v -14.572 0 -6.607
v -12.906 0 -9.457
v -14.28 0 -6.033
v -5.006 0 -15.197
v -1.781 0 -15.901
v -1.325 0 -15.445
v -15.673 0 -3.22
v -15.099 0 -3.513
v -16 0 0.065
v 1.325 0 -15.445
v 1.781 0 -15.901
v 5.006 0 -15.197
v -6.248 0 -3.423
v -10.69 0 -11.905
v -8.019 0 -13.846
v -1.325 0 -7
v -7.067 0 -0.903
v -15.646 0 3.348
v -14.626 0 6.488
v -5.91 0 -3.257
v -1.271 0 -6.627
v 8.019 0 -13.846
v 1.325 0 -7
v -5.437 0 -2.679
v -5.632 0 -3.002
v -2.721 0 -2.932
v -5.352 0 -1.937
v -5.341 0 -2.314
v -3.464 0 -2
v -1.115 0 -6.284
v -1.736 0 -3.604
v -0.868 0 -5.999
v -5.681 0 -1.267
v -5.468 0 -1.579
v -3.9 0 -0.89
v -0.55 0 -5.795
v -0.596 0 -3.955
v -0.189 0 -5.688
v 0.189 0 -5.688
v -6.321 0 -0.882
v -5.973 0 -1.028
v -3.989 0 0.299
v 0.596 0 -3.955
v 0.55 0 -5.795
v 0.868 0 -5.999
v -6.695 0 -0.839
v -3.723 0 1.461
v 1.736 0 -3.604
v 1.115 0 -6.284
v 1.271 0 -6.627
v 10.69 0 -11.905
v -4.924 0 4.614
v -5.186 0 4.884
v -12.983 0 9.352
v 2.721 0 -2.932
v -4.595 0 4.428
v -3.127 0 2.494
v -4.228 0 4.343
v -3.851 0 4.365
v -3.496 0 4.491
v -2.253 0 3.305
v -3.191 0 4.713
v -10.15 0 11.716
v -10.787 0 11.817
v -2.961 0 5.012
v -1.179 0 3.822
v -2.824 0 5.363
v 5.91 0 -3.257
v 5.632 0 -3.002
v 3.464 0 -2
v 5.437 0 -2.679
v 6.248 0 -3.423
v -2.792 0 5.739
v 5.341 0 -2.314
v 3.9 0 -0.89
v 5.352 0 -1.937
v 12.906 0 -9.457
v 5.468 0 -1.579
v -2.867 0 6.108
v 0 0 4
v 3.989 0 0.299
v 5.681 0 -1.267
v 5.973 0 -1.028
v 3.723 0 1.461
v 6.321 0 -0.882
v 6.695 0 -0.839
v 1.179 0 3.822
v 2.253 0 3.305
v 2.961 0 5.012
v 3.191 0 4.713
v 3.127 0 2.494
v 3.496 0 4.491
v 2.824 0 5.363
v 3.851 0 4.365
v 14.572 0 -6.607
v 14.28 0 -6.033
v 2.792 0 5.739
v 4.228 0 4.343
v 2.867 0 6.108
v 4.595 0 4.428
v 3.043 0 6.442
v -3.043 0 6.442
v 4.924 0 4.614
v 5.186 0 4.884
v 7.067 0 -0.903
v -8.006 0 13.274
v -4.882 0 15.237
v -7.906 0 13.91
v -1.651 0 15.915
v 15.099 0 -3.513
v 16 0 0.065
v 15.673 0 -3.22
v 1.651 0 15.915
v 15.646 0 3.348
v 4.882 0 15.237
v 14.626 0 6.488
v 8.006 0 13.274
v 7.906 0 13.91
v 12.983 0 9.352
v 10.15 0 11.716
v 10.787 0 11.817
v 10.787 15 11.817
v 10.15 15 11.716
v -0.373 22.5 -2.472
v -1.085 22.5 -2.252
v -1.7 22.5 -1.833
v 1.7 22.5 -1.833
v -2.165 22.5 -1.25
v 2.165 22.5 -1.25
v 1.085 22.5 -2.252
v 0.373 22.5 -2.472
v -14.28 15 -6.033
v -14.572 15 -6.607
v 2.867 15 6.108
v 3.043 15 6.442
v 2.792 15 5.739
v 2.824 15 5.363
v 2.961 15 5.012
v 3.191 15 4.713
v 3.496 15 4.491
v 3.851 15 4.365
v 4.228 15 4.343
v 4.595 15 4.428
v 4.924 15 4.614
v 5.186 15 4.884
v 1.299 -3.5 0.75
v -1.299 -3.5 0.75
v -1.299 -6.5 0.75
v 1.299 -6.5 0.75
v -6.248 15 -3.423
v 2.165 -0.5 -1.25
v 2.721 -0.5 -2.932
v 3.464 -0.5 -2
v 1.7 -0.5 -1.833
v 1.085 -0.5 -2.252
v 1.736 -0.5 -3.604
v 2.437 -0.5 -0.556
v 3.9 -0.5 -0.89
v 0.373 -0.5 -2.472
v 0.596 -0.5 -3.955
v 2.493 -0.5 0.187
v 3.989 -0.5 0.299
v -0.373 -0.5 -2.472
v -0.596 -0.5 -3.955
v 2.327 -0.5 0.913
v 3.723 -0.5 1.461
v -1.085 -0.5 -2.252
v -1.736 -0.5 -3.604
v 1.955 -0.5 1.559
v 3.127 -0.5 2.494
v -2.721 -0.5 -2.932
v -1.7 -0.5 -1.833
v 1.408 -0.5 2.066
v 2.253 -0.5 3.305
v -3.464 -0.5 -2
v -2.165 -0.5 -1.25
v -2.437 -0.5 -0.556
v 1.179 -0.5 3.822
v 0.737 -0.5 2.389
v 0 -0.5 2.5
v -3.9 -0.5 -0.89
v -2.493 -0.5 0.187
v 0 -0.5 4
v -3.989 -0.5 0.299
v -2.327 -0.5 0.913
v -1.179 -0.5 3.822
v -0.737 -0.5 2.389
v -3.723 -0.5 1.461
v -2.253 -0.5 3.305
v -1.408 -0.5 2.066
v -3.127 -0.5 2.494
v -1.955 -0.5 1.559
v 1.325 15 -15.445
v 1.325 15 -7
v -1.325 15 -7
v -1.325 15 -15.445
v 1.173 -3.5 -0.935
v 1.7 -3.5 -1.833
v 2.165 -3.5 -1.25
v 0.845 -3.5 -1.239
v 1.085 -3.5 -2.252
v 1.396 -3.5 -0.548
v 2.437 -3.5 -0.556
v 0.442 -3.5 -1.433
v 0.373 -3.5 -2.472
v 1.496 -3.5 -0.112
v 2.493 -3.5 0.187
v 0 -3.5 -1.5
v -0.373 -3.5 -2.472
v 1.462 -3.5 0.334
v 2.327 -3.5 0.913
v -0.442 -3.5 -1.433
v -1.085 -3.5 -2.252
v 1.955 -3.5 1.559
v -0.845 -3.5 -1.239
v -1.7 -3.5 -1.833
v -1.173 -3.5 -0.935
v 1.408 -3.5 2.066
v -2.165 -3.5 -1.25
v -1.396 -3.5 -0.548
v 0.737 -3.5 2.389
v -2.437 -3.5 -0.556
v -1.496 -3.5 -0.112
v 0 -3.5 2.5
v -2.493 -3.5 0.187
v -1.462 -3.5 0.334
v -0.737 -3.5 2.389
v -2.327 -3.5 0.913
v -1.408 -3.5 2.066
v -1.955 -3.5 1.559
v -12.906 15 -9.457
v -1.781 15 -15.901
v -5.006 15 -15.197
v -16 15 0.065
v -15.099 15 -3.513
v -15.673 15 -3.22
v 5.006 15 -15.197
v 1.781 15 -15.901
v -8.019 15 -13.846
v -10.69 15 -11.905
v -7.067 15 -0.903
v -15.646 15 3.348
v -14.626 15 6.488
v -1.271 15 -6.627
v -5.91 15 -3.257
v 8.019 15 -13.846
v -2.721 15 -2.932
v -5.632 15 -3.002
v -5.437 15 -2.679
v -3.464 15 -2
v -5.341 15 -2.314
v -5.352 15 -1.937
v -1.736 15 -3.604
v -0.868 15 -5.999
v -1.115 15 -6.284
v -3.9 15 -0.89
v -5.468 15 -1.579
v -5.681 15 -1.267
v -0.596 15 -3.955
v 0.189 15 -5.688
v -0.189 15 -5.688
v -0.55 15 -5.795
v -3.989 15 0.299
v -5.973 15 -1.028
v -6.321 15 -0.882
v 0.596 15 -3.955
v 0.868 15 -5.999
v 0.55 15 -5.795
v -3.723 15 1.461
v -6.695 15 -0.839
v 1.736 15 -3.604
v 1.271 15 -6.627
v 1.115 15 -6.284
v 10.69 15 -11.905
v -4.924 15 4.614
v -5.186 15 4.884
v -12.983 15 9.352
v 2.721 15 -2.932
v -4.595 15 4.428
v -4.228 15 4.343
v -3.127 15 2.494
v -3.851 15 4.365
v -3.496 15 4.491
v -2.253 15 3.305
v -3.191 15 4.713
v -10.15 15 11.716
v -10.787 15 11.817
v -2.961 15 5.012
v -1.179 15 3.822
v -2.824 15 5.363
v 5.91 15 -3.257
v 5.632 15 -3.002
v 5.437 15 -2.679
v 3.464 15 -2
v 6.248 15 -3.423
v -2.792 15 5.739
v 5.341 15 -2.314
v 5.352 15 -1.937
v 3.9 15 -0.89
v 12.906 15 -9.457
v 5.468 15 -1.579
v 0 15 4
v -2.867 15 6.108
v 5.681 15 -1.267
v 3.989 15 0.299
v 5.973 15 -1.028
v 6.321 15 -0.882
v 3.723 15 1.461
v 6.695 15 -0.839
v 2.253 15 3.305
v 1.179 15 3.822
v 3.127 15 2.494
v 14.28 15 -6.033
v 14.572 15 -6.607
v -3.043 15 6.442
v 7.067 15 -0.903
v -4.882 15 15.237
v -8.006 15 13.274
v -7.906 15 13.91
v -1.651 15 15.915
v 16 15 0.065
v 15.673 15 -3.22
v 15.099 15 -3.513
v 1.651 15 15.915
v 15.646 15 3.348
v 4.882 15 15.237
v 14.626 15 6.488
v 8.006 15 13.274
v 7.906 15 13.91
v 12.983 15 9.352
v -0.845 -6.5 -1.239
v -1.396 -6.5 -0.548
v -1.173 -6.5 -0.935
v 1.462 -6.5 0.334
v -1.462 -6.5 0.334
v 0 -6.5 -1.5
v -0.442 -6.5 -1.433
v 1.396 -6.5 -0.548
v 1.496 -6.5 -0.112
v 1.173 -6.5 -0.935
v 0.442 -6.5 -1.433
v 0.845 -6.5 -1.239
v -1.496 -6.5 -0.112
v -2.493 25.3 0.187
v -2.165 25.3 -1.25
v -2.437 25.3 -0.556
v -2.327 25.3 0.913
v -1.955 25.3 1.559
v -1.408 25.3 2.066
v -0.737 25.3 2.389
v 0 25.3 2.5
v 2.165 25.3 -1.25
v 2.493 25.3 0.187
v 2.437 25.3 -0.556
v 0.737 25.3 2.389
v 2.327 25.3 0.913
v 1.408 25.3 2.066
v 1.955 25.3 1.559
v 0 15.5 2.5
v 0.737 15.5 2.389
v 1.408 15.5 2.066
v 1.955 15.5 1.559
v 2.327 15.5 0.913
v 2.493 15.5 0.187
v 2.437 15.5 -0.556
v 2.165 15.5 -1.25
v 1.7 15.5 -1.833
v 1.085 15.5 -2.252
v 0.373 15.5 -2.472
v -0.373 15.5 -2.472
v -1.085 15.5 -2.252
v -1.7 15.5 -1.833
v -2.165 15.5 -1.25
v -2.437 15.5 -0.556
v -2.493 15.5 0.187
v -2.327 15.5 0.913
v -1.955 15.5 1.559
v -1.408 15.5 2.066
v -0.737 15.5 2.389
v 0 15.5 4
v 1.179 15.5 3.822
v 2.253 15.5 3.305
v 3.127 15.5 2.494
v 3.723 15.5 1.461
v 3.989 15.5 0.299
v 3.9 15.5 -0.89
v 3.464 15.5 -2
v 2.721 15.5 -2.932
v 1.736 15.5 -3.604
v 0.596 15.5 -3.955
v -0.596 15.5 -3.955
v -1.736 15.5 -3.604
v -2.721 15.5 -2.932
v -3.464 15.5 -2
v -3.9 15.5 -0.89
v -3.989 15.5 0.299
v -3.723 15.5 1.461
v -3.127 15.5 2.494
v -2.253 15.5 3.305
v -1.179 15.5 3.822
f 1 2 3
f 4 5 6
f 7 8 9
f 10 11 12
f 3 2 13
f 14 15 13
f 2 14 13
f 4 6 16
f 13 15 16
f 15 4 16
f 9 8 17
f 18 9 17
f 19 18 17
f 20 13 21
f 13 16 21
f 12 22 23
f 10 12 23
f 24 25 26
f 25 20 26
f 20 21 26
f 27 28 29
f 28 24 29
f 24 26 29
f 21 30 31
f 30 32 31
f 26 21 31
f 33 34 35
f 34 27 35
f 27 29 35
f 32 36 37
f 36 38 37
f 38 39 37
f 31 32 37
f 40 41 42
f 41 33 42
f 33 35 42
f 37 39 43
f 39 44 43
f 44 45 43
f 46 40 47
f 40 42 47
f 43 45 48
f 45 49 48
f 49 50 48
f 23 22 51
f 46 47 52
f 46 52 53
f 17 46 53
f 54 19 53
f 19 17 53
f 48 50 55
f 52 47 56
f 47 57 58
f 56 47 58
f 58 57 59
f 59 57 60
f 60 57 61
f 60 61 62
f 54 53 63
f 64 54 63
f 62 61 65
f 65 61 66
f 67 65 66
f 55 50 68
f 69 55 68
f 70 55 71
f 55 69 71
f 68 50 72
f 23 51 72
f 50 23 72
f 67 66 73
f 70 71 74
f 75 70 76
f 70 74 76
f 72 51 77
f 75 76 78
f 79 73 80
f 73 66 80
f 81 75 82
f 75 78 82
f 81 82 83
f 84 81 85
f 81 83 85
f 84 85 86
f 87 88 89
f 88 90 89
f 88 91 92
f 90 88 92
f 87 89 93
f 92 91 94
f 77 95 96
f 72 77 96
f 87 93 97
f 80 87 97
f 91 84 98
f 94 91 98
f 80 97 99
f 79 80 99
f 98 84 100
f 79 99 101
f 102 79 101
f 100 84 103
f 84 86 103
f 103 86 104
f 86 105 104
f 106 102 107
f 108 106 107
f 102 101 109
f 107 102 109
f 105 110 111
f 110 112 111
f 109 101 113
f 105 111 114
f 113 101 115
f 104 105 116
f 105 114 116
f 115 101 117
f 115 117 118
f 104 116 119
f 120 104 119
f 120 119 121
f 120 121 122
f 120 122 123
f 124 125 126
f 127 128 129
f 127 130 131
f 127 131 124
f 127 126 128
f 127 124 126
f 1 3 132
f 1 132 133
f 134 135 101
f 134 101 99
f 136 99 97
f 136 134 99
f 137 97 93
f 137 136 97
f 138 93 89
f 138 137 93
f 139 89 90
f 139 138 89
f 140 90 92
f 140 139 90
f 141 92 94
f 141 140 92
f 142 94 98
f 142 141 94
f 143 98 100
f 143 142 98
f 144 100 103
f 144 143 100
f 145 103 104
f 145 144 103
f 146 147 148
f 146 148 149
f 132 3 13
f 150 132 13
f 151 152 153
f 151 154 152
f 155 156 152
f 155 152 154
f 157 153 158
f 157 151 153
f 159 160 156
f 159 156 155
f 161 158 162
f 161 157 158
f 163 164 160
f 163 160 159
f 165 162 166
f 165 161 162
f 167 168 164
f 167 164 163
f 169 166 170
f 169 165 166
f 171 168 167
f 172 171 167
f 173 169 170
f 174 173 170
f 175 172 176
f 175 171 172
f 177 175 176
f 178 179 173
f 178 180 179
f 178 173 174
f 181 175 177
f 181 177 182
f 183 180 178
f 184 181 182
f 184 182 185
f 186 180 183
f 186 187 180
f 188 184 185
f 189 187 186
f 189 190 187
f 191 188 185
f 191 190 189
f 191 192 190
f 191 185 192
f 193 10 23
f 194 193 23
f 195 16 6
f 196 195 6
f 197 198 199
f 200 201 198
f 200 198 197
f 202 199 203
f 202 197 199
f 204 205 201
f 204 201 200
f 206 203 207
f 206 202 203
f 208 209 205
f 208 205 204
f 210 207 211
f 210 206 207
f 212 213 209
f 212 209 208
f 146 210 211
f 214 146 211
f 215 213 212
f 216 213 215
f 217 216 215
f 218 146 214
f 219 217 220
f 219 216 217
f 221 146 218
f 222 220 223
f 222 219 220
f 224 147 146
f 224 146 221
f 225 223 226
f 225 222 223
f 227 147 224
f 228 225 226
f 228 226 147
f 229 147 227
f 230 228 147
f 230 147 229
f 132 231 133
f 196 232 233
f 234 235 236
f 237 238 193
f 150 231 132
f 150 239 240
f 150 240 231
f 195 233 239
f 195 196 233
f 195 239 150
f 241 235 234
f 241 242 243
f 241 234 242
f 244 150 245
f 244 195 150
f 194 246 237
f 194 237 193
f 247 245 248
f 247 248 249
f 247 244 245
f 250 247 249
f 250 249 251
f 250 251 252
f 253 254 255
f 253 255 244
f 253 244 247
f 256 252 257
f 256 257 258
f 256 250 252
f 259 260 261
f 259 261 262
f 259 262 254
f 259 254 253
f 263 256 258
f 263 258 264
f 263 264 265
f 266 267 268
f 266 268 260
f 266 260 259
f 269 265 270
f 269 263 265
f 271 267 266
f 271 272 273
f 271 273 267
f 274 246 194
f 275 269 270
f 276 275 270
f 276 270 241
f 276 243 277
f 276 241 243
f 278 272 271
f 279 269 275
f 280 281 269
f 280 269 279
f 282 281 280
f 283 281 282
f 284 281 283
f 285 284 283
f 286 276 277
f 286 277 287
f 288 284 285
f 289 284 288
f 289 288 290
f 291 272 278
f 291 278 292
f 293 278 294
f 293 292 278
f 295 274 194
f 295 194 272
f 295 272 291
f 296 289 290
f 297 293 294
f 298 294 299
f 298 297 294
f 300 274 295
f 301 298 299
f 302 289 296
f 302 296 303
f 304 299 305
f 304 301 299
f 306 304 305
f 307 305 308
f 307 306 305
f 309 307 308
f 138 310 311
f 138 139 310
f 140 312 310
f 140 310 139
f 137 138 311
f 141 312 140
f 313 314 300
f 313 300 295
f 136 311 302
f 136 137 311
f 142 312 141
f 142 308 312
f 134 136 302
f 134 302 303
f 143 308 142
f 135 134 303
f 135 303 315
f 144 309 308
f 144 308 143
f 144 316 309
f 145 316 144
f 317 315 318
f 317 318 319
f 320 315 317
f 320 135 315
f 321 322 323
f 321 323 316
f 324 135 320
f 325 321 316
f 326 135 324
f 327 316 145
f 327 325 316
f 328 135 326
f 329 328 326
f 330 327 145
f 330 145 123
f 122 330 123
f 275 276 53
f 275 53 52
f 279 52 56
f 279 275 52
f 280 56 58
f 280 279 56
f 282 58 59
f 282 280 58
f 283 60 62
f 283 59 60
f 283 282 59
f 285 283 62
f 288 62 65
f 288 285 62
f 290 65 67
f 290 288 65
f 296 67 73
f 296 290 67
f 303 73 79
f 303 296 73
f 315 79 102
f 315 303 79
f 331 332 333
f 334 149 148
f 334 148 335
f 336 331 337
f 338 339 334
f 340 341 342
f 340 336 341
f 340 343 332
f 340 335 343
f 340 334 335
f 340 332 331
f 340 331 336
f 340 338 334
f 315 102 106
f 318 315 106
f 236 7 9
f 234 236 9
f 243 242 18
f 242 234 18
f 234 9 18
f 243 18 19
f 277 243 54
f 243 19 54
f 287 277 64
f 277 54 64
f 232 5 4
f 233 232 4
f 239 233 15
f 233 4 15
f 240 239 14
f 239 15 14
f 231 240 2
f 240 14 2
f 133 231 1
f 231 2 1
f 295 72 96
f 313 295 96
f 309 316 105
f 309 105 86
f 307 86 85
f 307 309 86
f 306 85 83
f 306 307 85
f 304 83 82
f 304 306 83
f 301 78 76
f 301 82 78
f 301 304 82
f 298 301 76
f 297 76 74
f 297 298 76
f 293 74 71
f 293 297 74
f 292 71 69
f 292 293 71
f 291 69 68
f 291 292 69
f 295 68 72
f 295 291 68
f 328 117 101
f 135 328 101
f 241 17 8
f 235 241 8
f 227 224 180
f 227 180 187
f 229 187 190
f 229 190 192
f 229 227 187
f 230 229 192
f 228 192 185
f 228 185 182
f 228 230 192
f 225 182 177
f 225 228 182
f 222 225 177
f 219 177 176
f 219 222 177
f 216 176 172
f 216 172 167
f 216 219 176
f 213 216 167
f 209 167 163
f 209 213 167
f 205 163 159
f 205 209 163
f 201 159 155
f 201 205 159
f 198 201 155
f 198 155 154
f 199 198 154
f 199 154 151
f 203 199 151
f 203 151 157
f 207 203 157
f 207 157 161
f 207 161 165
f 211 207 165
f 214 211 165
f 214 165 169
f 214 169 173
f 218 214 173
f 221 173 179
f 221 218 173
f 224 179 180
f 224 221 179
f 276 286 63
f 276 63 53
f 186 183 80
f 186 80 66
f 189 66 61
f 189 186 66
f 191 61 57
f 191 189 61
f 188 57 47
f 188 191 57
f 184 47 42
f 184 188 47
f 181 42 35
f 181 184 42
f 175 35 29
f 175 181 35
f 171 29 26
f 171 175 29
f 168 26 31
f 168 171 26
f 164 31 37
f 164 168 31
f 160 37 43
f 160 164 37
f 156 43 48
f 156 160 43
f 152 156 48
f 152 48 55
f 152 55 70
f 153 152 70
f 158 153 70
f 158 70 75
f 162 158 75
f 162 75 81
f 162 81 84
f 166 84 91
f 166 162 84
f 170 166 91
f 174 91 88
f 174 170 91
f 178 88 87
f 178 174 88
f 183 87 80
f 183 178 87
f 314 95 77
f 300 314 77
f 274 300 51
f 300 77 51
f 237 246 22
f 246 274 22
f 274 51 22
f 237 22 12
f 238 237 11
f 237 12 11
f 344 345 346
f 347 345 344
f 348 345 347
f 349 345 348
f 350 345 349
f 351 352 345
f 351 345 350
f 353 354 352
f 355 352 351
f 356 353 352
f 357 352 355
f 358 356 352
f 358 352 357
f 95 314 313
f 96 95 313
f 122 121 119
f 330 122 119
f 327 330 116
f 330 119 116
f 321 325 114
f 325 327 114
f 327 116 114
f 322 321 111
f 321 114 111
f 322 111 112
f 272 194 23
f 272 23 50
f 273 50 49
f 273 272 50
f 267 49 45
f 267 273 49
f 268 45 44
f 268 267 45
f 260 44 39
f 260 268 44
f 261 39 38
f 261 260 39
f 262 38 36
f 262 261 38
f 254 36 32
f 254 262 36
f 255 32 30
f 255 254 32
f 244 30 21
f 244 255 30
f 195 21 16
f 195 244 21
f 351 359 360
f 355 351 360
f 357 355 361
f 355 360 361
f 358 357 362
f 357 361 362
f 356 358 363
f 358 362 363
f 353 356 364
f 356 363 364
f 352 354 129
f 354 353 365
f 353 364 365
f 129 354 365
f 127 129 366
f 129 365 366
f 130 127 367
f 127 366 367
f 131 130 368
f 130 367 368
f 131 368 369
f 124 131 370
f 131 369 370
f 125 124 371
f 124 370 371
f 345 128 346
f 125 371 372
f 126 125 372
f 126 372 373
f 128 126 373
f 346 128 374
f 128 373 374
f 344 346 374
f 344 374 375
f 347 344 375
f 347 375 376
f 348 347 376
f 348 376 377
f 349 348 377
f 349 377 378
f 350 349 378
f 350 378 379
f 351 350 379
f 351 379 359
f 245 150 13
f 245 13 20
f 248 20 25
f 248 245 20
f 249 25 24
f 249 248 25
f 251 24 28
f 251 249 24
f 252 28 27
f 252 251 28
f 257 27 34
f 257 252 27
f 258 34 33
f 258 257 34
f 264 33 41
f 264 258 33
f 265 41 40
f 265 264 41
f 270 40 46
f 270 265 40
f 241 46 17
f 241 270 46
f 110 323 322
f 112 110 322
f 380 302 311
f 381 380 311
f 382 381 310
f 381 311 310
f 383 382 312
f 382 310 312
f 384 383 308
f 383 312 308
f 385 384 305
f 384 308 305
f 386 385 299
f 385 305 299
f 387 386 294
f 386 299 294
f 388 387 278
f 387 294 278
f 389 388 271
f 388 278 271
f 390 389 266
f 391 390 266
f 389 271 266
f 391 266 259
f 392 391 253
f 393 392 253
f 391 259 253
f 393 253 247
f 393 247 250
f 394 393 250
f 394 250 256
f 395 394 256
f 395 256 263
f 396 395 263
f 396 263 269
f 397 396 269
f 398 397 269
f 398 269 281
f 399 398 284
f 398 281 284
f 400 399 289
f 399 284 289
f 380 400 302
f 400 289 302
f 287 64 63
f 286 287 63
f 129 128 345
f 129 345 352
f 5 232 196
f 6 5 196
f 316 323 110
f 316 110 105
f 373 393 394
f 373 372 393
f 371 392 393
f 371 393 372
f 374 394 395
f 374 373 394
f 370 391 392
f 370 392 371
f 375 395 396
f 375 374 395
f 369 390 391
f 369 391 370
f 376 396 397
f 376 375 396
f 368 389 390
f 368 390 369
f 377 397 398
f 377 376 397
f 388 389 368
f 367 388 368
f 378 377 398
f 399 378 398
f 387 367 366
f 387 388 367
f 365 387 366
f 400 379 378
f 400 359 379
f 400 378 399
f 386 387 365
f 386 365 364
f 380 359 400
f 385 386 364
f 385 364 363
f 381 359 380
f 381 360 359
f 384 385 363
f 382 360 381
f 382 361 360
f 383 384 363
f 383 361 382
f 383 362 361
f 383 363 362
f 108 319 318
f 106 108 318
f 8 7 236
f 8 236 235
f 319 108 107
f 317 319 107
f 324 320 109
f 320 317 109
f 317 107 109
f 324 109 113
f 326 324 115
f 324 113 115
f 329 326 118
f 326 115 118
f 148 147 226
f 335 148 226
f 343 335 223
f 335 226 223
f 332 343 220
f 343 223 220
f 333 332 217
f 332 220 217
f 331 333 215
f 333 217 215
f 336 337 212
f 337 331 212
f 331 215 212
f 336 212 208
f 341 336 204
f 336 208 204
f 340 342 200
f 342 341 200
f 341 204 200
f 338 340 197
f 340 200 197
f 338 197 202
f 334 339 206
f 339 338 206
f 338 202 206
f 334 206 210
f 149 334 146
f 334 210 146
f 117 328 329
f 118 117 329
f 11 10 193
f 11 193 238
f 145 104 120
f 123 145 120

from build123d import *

# Parameters (mm, degrees)
SKETCH_1_R               = 16
EXTRUDE_1_DEPTH          = 15
SKETCH_2_R               = 4
EXTRUDE_2_DEPTH          = 0.5
EXTRUDE_START            = 0.5
SKETCH_3_R               = 4
EXTRUDE_3_DEPTH          = 0.5
SKETCH_4_R               = 2.5
EXTRUDE_4_DEPTH          = 9.8
EXTRUDE_START_2          = 3
SKETCH_5_R               = 2.5
EXTRUDE_5_DEPTH          = 3
CUT_EXTRUDE_START        = -2.8
CUT_EXTRUDE_1_DEPTH      = 2.8
CUT_EXTRUDE_2_DEPTH      = 30.227555491
PATTERN_CIRCULAR_1_COUNT = 5
SKETCH_8_R               = 1.5
EXTRUDE_6_DEPTH          = 3
CHAMFER_1_SIZE           = 0.5
CUT_EXTRUDE_START_2      = -3
CUT_EXTRUDE_3_DEPTH      = 3


with BuildPart() as part:
    # 草图1 → 凸台-拉伸1 (new body)
    with BuildSketch(Plane(origin=(0, 0, 0), x_dir=(1, 0, 0), z_dir=(0, 1, 0))):
        with Locations(Location((0, 0, 0), (0, 0, 270))):
            Circle(SKETCH_1_R)
    extrude(amount=EXTRUDE_1_DEPTH)

    # 草图2 → 凸台-拉伸2 (add)
    with BuildSketch(Plane(origin=(0, 15, 0), x_dir=(1, 0, 0), z_dir=(0, 1, 0))):
        with Locations(Location((0, 0, 0), (0, 0, 270))):
            Circle(SKETCH_2_R)
    extrude(amount=EXTRUDE_2_DEPTH)

    # 草图3 → 凸台-拉伸3 (add)
    with BuildSketch(Plane.XZ.offset(EXTRUDE_START)):
        with Locations(Location((0, 0, 0), (0, 0, 90))):
            Circle(SKETCH_3_R)
    extrude(amount=-EXTRUDE_3_DEPTH)

    # 草图4 → 凸台-拉伸4 (add)
    with BuildSketch(Plane(origin=(0, 15.5, 0), x_dir=(1, 0, 0), z_dir=(0, 1, 0))):
        with Locations(Location((0, 0, 0), (0, 0, 270))):
            Circle(SKETCH_4_R)
    extrude(amount=EXTRUDE_4_DEPTH)

    # 草图5 → 凸台-拉伸5 (add)
    with BuildSketch(Plane.XZ.offset(0.5).offset(EXTRUDE_START_2)):
        with Locations(Location((0, 0, 0), (0, 0, 90))):
            Circle(SKETCH_5_R)
    extrude(amount=-EXTRUDE_5_DEPTH)

    # 草图6 → 切除-拉伸1 (cut)
    with BuildSketch(Plane(origin=(0, 25.3, 0), x_dir=(1, 0, 0), z_dir=(0, 1, 0)).offset(CUT_EXTRUDE_START)):
        with BuildLine():
            Line((-2.165063509, 1.25), (2.165063509, 1.25))
            ThreePointArc((2.165063509, 1.25), (0, 2.5), (-2.165063509, 1.25))
        make_face()
    extrude(amount=CUT_EXTRUDE_1_DEPTH, mode=Mode.SUBTRACT)

    # 草图7 → 切除-拉伸2 (cut, through all)
    with BuildSketch(Plane(origin=(0, 15, 0), x_dir=(1, 0, 0), z_dir=(0, 1, 0))):
        with BuildLine():
            Line((-1.325, 7), (-1.325, 19))
            Line((-1.325, 19), (1.325, 19))
            Line((1.325, 19), (1.325, 7))
            ThreePointArc((1.325, 7), (0, 5.675), (-1.325, 7))
        make_face()
    cut_extrude_2 = extrude(amount=-CUT_EXTRUDE_2_DEPTH, mode=Mode.SUBTRACT)

    # 阵列(圆周)1: 切除-拉伸2 ×5 about axis
    pattern_circular_1_axis = Axis((0, 0, 0), (0, 1, 0))
    for i in range(1, PATTERN_CIRCULAR_1_COUNT):
        add(cut_extrude_2.rotate(pattern_circular_1_axis, i * 360 / PATTERN_CIRCULAR_1_COUNT), mode=Mode.SUBTRACT)

    # 草图8 → 凸台-拉伸6 (add)
    with BuildSketch(Plane.XZ.offset(3.5)):
        with Locations(Location((0, 0, 0), (0, 0, 270))):
            Circle(SKETCH_8_R)
    extrude(amount=EXTRUDE_6_DEPTH)

    # 倒角1
    # the kernel refuses this chamfer: 0.5, 0.463229901 mm, written as the material it takes off along each edge
    with BuildSketch(Plane(origin=(-1.325, 16.285841494, -15.945042333), x_dir=(-0.9952786218717831, 0, 0.09705907914772452), z_dir=(0, -1, 0)), Plane(origin=(14.755188896, 16.285841494, -6.187438941), x_dir=(-0.39986667798550435, 0, -0.9165733139453914), z_dir=(0, -1, 0)), Plane(origin=(10.444208248, 16.285841494, 12.120994764), x_dir=(0.7481474239082289, 0, -0.6635325403471037), z_dir=(0, -1, 0)), Plane(origin=(-8.300313213, 16.285841494, 13.678625683), x_dir=(0.8622472145564707, 0, 0.5064876513693177), z_dir=(0, -1, 0)), Plane(origin=(-15.574083931, 16.285841494, -3.667139173), x_dir=(-0.21524933860740833, 0, 0.9765591237754493), z_dir=(0, -1, 0))) as chamfer_1_piece_1:
        with BuildLine():
            Line((0.457733904, 0), (CHAMFER_1_SIZE * 0.0970590791477, -CHAMFER_1_SIZE * 0.995278621872))
            Line((CHAMFER_1_SIZE * 0.0970590791477, -CHAMFER_1_SIZE * 0.995278621872), (0, 0))
            ThreePointArc((0, 0), (0.235215907, 0.001635702), (0.457733904, 0))
        make_face()
    extrude(amount=17.571682988, mode=Mode.SUBTRACT)
    with BuildSketch(Plane(origin=(1.325, 16.285841494, -15.945042333), x_dir=(0, 0, 1), z_dir=(0, -1, 0)), Plane(origin=(15.574083931, 16.285841494, -3.667139173), x_dir=(-0.9510565162951534, 0, 0.3090169943749483), z_dir=(0, -1, 0)), Plane(origin=(8.300313213, 16.285841494, 13.678625683), x_dir=(-0.5877852522924737, 0, -0.809016994374947), z_dir=(0, -1, 0)), Plane(origin=(-14.755188896, 16.285841494, -6.187438941), x_dir=(0.9510565162951536, 0, 0.3090169943749472), z_dir=(0, -1, 0))) as chamfer_1_piece_2:
        with BuildLine():
            Line((CHAMFER_1_SIZE, 0), (0.044427231, -0.455572769))
            ThreePointArc((0.044427231, -0.455572769), (0.02120186, -0.234264124), (0, 0))
            Line((0, 0), (CHAMFER_1_SIZE, 0))
        make_face()
    extrude(amount=17.571682988, mode=Mode.SUBTRACT)
    with BuildSketch(Plane(origin=(-10.444208248, 16.285841494, 12.120994764), x_dir=(-0.7481474239082269, 0, -0.6635325403471058), z_dir=(0, -1, 0))) as chamfer_1_piece_3:
        with BuildLine():
            Line((0.457733904, 0), (CHAMFER_1_SIZE * 0.0970590791477, CHAMFER_1_SIZE * 0.995278621872))
            Line((CHAMFER_1_SIZE * 0.0970590791477, CHAMFER_1_SIZE * 0.995278621872), (0, 0))
            ThreePointArc((0, 0), (0.235215907, -0.001635702), (0.457733904, 0))
        make_face()
    extrude(amount=17.571682988, mode=Mode.SUBTRACT)

    # 草图9 → 切除-拉伸3 (cut)
    with BuildSketch(Plane.XZ.offset(6.5).offset(CUT_EXTRUDE_START_2)):
        with BuildLine():
            Line((-1.299038106, 0.75), (1.299038106, 0.75))
            ThreePointArc((1.299038106, 0.75), (0, 1.5), (-1.299038106, 0.75))
        make_face()
    extrude(amount=CUT_EXTRUDE_3_DEPTH, mode=Mode.SUBTRACT)


solid = part.part
